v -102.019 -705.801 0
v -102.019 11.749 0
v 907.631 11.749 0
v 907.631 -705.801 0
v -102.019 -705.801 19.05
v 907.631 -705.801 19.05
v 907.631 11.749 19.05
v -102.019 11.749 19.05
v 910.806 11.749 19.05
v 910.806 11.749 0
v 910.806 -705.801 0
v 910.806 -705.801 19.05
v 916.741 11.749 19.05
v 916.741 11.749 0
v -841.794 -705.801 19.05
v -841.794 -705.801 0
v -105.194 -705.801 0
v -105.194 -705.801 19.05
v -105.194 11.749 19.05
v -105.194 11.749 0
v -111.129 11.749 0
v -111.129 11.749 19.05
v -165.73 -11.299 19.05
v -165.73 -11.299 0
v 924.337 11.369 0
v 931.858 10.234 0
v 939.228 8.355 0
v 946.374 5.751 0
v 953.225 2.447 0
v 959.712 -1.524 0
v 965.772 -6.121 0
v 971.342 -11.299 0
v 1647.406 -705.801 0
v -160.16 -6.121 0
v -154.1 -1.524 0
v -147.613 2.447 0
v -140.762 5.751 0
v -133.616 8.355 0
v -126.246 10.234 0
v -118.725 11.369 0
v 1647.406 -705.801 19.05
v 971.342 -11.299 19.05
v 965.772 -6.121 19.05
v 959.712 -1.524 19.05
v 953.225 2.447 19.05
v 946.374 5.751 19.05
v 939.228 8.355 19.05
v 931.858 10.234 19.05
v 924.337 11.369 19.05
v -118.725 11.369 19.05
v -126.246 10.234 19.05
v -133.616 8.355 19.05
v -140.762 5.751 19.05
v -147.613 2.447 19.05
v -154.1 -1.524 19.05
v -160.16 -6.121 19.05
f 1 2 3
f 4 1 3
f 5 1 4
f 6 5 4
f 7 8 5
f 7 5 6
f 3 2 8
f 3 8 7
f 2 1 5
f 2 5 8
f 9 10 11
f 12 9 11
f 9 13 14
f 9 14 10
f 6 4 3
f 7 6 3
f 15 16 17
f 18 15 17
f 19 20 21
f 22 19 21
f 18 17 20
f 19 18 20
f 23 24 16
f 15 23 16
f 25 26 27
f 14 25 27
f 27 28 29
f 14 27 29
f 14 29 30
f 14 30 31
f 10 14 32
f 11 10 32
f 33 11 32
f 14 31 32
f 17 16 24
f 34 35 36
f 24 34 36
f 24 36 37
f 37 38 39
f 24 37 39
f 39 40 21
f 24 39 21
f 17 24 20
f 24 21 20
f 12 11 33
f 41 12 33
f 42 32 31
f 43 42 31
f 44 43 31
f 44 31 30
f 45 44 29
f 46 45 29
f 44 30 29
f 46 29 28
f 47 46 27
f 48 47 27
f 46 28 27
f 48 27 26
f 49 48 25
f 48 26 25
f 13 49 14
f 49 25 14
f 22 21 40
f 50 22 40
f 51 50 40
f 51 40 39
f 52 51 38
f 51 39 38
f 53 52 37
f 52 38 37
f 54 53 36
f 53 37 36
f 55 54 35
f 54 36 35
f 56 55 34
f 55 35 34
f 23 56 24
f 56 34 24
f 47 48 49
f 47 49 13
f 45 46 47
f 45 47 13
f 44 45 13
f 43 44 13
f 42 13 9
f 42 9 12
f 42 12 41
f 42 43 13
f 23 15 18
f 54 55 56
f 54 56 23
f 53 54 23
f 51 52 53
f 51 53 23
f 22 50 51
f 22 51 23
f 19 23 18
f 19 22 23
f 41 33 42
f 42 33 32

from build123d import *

# Parameters (mm, degrees)
F1_W     = 1009.65
F1_H     = 717.55
F2_DEPTH = 19.05


with BuildPart() as f2:
    # F1 (on Top) → F2 (new body)
    with BuildSketch(Plane.XY):
        with BuildLine():
            Line((-165.730246, -11.299409), (-841.794007, -705.801273))
            Line((-841.794007, -705.801273), (-105.194007, -705.801273))
            Line((-105.194007, -705.801273), (-105.194007, 11.748727))
            Line((-105.194007, 11.748727), (-111.128786, 11.748727))
            ThreePointArc((-111.128786, 11.748727), (-140.762112, 5.750622), (-165.730246, -11.299409))
        make_face()
        with Locations((402.805993, -347.026273)):
            Rectangle(F1_W, F1_H)
        with BuildLine():
            Line((916.740772, 11.748727), (910.805993, 11.748727))
            Line((910.805993, 11.748727), (910.805993, -705.801273))
            Line((910.805993, -705.801273), (1647.405993, -705.801273))
            Line((1647.405993, -705.801273), (971.342232, -11.299409))
            ThreePointArc((971.342232, -11.299409), (946.374098, 5.750622), (916.740772, 11.748727))
        make_face()
    extrude(amount=F2_DEPTH)


solid = f2.part
